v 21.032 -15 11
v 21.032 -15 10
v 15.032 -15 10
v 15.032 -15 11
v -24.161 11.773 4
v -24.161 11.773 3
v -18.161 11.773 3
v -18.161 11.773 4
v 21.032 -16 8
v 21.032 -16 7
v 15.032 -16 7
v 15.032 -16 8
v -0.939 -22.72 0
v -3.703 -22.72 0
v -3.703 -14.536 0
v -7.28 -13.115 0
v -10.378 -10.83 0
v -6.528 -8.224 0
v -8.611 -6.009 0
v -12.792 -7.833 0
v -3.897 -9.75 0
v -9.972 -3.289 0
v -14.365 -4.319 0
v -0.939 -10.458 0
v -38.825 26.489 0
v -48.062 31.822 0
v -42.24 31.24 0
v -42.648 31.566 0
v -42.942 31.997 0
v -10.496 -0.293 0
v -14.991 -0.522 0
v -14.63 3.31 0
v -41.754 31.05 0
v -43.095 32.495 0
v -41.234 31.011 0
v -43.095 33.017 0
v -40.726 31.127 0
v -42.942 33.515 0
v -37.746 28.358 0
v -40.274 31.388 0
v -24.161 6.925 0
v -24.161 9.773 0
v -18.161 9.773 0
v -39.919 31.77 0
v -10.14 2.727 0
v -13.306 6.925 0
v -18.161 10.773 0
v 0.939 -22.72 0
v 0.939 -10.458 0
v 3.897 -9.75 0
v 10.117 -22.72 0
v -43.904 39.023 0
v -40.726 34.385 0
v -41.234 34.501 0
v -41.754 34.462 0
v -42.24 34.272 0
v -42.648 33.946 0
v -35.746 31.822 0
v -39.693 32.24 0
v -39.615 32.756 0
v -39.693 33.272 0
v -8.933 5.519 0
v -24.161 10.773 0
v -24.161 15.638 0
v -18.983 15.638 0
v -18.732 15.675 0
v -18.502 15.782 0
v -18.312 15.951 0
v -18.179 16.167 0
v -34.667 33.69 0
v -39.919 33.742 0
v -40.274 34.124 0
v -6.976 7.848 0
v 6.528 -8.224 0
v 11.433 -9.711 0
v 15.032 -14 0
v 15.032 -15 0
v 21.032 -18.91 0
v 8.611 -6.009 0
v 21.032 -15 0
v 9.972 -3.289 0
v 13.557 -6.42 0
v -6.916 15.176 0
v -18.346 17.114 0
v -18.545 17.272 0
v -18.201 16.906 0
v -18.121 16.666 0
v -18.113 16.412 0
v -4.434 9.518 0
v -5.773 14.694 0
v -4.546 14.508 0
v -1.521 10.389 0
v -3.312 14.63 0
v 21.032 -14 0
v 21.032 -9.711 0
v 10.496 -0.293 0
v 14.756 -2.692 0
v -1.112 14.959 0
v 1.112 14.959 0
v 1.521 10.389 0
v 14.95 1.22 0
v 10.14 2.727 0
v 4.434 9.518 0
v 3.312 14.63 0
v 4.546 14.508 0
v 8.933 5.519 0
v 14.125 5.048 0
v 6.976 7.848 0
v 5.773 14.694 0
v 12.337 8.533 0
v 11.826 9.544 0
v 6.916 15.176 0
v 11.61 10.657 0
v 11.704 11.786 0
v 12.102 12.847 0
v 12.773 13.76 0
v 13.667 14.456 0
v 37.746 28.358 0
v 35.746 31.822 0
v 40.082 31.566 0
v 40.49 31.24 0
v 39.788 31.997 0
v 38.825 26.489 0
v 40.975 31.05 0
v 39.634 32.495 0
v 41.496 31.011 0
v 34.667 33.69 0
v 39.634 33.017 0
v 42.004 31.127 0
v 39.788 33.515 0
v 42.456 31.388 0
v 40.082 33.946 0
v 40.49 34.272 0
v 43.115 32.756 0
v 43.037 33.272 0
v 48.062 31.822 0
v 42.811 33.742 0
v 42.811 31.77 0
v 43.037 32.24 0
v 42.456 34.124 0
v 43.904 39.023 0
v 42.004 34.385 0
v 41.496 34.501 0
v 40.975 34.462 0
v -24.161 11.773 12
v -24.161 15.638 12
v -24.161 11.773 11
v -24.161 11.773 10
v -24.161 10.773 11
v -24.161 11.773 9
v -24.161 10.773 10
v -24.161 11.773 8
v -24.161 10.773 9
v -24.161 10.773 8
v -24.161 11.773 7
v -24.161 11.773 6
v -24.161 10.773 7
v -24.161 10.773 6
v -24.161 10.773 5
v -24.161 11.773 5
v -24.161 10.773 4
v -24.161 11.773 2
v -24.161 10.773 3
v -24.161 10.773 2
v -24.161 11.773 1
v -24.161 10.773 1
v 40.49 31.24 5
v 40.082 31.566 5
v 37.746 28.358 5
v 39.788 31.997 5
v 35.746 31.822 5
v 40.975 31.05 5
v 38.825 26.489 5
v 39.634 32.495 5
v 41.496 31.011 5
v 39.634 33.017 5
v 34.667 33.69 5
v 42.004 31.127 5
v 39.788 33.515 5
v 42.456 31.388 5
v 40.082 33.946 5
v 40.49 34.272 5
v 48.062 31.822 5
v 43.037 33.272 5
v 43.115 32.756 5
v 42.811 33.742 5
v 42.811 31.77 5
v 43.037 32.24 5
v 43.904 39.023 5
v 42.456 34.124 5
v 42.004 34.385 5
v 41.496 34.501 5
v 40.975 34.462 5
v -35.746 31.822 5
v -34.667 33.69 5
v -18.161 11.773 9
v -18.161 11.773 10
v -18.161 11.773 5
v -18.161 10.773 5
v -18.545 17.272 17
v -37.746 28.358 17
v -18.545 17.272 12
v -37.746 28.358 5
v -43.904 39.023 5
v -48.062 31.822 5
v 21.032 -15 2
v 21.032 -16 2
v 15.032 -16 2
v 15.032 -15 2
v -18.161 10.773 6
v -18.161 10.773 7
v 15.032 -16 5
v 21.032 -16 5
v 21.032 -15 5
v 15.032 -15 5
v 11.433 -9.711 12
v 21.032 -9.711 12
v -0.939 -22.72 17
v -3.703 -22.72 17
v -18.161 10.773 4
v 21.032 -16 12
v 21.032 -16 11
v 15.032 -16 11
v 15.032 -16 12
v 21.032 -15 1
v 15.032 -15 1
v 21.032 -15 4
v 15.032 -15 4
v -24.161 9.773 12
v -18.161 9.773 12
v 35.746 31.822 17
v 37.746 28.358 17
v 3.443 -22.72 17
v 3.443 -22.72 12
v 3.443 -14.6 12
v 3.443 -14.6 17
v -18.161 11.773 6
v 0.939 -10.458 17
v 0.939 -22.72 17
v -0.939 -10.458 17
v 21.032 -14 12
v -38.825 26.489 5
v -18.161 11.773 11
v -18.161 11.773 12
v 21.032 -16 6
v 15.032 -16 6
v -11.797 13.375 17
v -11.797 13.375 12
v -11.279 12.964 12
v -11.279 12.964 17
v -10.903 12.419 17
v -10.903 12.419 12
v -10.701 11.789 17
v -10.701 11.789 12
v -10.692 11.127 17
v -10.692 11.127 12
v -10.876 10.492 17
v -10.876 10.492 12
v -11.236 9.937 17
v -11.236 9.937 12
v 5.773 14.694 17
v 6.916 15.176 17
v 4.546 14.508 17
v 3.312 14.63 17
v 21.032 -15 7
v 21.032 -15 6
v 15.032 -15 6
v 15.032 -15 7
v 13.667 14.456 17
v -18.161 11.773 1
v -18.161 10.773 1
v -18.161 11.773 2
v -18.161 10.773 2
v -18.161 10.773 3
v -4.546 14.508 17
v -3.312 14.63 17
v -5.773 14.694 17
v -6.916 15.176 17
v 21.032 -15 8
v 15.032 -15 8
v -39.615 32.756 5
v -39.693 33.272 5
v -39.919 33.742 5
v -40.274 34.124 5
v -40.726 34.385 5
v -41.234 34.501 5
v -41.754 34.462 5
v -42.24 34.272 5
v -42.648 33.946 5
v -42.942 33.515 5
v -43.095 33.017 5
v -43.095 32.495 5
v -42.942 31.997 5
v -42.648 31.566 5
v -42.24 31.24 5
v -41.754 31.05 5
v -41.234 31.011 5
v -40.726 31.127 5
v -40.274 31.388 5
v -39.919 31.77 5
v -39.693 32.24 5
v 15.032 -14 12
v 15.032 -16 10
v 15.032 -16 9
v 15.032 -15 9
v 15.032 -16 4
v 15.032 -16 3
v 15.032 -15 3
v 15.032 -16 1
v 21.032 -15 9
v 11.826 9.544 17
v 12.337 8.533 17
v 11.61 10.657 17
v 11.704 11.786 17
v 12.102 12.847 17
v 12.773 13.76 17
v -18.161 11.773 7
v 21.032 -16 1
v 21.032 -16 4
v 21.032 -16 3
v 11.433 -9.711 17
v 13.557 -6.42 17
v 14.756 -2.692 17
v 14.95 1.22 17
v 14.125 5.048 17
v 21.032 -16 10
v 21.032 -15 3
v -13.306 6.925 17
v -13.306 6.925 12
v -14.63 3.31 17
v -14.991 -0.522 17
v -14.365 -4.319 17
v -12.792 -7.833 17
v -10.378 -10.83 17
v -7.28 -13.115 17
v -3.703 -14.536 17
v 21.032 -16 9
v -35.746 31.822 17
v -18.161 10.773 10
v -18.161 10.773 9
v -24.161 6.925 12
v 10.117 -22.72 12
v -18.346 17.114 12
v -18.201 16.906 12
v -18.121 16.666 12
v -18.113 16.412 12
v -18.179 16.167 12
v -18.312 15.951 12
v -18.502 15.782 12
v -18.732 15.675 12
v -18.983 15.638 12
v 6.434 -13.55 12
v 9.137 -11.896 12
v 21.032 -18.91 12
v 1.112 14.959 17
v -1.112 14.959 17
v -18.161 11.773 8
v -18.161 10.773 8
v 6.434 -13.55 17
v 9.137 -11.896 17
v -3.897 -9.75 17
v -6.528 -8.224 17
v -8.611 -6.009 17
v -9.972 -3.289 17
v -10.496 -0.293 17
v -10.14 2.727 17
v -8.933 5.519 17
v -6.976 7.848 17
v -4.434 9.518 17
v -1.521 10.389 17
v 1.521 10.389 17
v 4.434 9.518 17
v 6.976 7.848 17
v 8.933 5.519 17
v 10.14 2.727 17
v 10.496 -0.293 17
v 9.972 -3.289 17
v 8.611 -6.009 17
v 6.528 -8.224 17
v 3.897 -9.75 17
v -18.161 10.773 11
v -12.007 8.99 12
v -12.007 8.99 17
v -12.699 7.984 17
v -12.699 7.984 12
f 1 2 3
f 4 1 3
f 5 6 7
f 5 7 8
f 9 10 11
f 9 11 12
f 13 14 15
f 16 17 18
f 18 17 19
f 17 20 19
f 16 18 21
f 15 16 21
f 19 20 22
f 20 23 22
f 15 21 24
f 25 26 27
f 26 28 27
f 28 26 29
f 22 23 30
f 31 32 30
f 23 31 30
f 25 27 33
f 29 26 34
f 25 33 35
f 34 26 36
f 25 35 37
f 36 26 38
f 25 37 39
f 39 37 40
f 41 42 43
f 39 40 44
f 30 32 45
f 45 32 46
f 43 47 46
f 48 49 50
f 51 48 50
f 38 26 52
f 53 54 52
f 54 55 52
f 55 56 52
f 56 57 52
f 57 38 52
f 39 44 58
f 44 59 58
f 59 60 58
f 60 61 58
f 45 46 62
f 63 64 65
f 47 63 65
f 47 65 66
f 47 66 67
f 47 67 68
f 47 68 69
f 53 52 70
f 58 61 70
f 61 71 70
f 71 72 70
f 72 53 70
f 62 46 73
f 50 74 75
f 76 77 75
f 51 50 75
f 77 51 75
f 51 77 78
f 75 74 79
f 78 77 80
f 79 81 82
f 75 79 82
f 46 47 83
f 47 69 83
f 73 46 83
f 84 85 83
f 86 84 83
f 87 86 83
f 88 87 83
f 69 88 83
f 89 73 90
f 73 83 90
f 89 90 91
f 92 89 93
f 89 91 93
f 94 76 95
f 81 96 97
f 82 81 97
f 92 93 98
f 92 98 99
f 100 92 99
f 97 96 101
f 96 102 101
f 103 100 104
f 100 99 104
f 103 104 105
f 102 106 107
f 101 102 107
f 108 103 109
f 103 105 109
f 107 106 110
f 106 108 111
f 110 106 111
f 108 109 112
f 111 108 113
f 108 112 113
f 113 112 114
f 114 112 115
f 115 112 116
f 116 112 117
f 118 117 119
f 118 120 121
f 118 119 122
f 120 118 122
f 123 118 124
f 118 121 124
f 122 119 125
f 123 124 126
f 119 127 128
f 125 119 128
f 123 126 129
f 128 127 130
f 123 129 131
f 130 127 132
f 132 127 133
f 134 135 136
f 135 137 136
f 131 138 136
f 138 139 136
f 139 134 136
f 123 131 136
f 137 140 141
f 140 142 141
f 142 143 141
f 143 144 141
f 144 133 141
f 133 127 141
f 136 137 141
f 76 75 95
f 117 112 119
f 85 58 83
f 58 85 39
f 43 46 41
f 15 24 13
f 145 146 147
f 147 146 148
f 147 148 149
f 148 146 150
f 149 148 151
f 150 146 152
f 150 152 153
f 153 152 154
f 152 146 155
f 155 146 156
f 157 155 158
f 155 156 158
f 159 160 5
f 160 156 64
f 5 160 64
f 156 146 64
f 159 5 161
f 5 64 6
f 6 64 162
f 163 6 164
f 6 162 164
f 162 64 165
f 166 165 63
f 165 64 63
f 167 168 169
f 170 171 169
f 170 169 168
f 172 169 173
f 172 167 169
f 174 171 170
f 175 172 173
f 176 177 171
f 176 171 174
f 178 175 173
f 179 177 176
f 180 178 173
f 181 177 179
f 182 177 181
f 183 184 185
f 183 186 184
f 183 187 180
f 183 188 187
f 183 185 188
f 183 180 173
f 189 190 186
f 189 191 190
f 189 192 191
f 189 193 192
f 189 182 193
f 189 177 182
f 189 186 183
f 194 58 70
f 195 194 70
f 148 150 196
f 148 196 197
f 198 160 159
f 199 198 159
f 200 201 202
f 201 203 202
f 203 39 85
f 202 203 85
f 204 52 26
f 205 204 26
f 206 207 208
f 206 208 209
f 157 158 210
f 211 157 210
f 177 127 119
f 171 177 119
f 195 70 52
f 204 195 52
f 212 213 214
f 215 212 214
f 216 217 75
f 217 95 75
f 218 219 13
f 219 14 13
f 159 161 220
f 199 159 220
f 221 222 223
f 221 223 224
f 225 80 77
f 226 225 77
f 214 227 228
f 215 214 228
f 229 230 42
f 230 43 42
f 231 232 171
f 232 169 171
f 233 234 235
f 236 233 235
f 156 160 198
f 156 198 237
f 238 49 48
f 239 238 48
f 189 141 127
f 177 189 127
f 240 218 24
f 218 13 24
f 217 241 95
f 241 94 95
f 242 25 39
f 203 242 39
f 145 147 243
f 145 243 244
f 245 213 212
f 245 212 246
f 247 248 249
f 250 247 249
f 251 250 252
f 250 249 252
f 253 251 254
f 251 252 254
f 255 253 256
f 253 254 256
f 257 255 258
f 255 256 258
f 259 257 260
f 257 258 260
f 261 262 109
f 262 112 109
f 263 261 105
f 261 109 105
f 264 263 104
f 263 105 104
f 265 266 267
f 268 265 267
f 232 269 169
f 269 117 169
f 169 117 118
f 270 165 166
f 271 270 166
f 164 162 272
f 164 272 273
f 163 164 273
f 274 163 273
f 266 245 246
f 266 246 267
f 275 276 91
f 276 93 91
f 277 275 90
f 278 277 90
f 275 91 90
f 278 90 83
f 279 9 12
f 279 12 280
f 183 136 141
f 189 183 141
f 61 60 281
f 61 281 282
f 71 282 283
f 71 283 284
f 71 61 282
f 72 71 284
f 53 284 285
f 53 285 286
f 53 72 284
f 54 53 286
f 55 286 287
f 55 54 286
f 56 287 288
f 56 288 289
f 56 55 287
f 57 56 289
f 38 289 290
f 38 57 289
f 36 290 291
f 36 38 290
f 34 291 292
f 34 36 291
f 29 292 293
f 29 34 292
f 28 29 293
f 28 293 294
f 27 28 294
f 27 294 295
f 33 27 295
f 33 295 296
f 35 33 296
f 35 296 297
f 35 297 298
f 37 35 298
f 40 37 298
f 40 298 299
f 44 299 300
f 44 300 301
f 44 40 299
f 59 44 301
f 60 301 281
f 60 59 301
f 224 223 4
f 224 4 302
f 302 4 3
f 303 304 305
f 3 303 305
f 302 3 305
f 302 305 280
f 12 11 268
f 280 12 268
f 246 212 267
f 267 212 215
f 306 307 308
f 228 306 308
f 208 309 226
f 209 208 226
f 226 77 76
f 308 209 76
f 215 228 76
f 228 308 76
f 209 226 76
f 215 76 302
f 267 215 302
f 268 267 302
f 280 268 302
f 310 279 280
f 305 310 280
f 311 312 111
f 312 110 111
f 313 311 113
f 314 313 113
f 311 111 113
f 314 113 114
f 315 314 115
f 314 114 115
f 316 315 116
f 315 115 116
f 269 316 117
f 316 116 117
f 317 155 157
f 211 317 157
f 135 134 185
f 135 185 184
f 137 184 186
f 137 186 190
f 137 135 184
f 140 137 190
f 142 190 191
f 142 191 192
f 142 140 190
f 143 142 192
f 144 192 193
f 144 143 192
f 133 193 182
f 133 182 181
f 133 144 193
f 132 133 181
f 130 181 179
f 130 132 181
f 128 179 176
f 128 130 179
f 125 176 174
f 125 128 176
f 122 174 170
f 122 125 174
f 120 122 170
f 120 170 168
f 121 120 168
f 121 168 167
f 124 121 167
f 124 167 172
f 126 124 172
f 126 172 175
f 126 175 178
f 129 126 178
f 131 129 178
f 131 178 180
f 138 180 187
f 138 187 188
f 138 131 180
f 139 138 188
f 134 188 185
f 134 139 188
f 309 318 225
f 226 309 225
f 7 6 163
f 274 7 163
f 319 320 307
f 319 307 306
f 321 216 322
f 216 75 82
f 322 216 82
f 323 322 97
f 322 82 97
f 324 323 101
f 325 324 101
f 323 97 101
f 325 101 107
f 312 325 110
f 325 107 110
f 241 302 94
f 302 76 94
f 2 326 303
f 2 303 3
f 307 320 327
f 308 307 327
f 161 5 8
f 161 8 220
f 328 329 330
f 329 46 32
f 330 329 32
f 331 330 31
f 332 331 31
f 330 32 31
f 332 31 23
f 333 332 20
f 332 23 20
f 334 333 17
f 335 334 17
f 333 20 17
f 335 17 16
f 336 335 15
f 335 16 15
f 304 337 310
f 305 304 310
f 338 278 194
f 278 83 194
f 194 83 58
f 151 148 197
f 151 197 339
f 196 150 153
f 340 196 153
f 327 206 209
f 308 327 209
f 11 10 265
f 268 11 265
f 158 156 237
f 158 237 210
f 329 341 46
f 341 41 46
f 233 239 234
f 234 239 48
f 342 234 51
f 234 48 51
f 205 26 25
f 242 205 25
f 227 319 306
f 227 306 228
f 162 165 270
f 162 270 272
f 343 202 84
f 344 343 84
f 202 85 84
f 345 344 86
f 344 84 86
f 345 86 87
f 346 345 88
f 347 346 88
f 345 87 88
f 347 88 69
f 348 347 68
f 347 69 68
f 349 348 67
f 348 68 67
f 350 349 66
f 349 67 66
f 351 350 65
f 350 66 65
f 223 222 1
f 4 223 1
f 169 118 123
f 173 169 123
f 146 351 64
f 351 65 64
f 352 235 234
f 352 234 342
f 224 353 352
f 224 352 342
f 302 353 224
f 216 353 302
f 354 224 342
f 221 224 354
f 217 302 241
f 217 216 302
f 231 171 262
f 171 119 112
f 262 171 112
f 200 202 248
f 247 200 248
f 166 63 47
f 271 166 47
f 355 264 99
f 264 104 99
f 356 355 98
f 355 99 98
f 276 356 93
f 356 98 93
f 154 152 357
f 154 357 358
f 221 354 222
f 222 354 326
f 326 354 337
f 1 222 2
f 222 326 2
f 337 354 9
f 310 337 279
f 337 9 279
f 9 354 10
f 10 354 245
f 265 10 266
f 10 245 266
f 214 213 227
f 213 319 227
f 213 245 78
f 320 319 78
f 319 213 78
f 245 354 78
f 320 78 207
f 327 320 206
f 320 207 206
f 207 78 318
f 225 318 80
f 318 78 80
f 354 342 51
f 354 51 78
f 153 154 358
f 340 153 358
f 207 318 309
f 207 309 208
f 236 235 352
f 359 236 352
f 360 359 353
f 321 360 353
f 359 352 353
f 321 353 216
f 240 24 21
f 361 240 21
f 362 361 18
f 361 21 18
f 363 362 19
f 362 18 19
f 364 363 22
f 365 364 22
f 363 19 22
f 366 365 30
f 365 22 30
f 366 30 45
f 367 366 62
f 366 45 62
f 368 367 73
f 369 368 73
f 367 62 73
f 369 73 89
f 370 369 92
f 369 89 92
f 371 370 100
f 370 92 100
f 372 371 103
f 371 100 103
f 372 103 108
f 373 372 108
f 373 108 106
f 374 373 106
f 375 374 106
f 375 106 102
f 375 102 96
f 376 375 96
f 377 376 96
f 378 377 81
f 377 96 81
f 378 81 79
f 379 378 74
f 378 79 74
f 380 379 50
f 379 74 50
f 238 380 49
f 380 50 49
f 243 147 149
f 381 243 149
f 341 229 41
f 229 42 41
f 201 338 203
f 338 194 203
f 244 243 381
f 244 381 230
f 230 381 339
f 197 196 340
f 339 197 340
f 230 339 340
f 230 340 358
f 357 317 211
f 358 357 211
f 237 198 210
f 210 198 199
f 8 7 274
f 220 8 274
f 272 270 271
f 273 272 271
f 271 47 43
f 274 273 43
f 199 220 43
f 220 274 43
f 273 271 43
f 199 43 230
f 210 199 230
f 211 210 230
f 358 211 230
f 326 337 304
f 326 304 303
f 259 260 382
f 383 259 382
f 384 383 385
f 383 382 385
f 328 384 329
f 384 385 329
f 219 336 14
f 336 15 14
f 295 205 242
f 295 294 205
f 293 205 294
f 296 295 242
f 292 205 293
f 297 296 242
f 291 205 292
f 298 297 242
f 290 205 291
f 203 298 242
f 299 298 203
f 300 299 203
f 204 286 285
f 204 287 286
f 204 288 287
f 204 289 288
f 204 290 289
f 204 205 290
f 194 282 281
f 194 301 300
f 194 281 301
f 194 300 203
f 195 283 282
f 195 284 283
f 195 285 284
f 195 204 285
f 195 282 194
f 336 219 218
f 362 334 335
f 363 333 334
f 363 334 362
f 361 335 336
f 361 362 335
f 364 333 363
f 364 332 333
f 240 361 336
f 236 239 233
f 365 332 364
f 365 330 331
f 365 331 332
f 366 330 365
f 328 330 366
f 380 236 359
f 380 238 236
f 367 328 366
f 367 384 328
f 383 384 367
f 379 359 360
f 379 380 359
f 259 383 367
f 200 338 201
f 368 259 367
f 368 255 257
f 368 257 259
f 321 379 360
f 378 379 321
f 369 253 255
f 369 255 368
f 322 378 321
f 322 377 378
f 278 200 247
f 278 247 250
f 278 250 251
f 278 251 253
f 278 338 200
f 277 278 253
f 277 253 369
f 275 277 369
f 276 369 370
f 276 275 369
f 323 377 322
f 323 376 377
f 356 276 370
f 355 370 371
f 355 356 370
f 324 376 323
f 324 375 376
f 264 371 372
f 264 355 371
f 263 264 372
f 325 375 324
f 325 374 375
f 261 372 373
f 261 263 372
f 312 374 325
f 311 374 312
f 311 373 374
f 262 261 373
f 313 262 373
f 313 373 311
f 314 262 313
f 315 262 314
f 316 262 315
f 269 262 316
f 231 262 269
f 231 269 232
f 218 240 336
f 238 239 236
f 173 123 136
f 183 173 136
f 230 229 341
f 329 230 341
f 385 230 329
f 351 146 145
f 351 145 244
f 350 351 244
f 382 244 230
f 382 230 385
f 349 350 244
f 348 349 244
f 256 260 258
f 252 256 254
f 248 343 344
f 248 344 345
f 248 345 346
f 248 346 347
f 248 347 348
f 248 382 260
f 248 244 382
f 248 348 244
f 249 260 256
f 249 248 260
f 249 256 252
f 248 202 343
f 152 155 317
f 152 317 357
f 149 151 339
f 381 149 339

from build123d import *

# Parameters (mm, degrees)
F0_R     = 1.75
F1_DEPTH = 5
F3_DEPTH = 7
F5_DEPTH = 5
F6_W     = 1
F6_H     = 1
F7_DEPTH = 6
F8_W     = 1
F8_H     = 1
F9_DEPTH = 6


with BuildPart() as f1:
    # F0 (on Top) → F1 (new body)
    with BuildSketch(Plane.XY):
        with BuildLine():
            ThreePointArc((-0.9388981295, -10.4579381478), (0, 10.5), (0.9388981295, -10.4579381478))
            Line((0.9388981295, -10.4579381478), (0.9388981295, -14.9705868389))
            Line((0.9388981295, -14.9705868389), (0.9388981295, -22.7195436882))
            Line((0.9388981295, -22.7195436882), (4.4024475525, -22.7195436882))
            Line((4.4024475525, -22.7195436882), (10.116501772, -22.7195436882))
            Line((10.116501772, -22.7195436882), (21.0318053748, -18.9101754503))
            Line((21.0318053748, -18.9101754503), (21.0318053748, -15))
            Line((21.0318053748, -15), (15.0318053748, -15))
            Line((15.0318053748, -15), (15.0318053748, -14))
            Line((15.0318053748, -14), (21.0318053748, -14))
            Line((21.0318053748, -14), (21.0318053748, -9.7105238683))
            Line((21.0318053748, -9.7105238683), (11.4326605041, -9.7105238683))
            ThreePointArc((11.4326605041, -9.7105238683), (14.9816222336, -0.7422905424), (12.3365595381, 8.5328365016))
            ThreePointArc((12.3365595381, 8.5328365016), (11.704066925, 11.7858634787), (13.6674751693, 14.4555562485))
            Line((13.6674751693, 14.4555562485), (37.7463729757, 28.3575143788))
            Line((37.7463729757, 28.3575143788), (38.825355636, 26.4886615908))
            Line((38.825355636, 26.4886615908), (48.0623036168, 31.821615994))
            Line((48.0623036168, 31.821615994), (43.9043382963, 39.0234231853))
            Line((43.9043382963, 39.0234231853), (34.6673903154, 33.6904687821))
            Line((34.6673903154, 33.6904687821), (35.7463729757, 31.821615994))
            Line((35.7463729757, 31.821615994), (6.9158291977, 15.1762937829))
            ThreePointArc((6.9158291977, 15.1762937829), (5.1654246928, 14.5629294653), (3.3118718983, 14.6298156013))
            ThreePointArc((3.3118718983, 14.6298156013), (0, 15), (-3.3118718983, 14.6298156013))
            ThreePointArc((-3.3118718983, 14.6298156013), (-5.1654246928, 14.5629294653), (-6.9158291977, 15.1762937829))
            Line((-6.9158291977, 15.1762937829), (-35.7463729757, 31.821615994))
            Line((-35.7463729757, 31.821615994), (-34.6673903154, 33.6904687821))
            Line((-34.6673903154, 33.6904687821), (-43.9043382963, 39.0234231853))
            Line((-43.9043382963, 39.0234231853), (-48.0623036168, 31.821615994))
            Line((-48.0623036168, 31.821615994), (-38.825355636, 26.4886615908))
            Line((-38.825355636, 26.4886615908), (-37.7463729757, 28.3575143788))
            Line((-37.7463729757, 28.3575143788), (-18.5453659437, 17.2718078002))
            ThreePointArc((-18.5453659437, 17.2718078002), (-18.1373653852, 16.2868073185), (-18.9832044744, 15.6377721578))
            Line((-18.9832044744, 15.6377721578), (-24.1605976116, 15.6377721578))
            Line((-24.1605976116, 15.6377721578), (-24.1605976116, 10.7727729008))
            Line((-24.1605976116, 10.7727729008), (-18.1605976116, 10.7727729008))
            Line((-18.1605976116, 10.7727729008), (-18.1605976116, 9.7727729008))
            Line((-18.1605976116, 9.7727729008), (-24.1605976116, 9.7727729008))
            Line((-24.1605976116, 9.7727729008), (-24.1605976116, 6.9246333643))
            Line((-24.1605976116, 6.9246333643), (-13.3059931147, 6.9246333643))
            ThreePointArc((-13.3059931147, 6.9246333643), (-13.6917078006, -6.1267558709), (-3.7029089872, -14.5357650309))
            Line((-3.7029089872, -14.5357650309), (-3.7029089872, -22.7195436882))
            Line((-3.7029089872, -22.7195436882), (-0.9388981295, -22.7195436882))
            Line((-0.9388981295, -22.7195436882), (-0.9388981295, -14.9705868389))
            Line((-0.9388981295, -14.9705868389), (-0.9388981295, -10.4579381478))
        make_face()
        with Locations((-41.3648469661, 32.756042388)):
            Circle(F0_R, mode=Mode.SUBTRACT)
        with Locations((41.3648469661, 32.756042388)):
            Circle(F0_R, mode=Mode.SUBTRACT)
    extrude(amount=F1_DEPTH)

    # F2 (on face) → F3 (join)
    with BuildSketch(Plane.XY.offset(5)):
        with BuildLine():
            Line((37.7463729757, 28.3575143788), (35.7463729757, 31.821615994))
            Line((35.7463729757, 31.821615994), (6.9158291977, 15.1762937829))
            ThreePointArc((6.9158291977, 15.1762937829), (5.1654246928, 14.5629294653), (3.3118718983, 14.6298156013))
            ThreePointArc((3.3118718983, 14.6298156013), (0, 15), (-3.3118718983, 14.6298156013))
            ThreePointArc((-3.3118718983, 14.6298156013), (-5.1654246928, 14.5629294653), (-6.9158291977, 15.1762937829))
            Line((-6.9158291977, 15.1762937829), (-35.7463729757, 31.821615994))
            Line((-35.7463729757, 31.821615994), (-37.7463729757, 28.3575143788))
            Line((-37.7463729757, 28.3575143788), (-18.5453659437, 17.2718078002))
            ThreePointArc((-18.5453659437, 17.2718078002), (-18.1373653852, 16.2868073185), (-18.9832044744, 15.6377721578))
            Line((-18.9832044744, 15.6377721578), (-24.1605976116, 15.6377721578))
            Line((-24.1605976116, 15.6377721578), (-24.1605976116, 10.7727729008))
            Line((-24.1605976116, 10.7727729008), (-18.1605976116, 10.7727729008))
            Line((-18.1605976116, 10.7727729008), (-18.1605976116, 9.7727729008))
            Line((-18.1605976116, 9.7727729008), (-24.1605976116, 9.7727729008))
            Line((-24.1605976116, 9.7727729008), (-24.1605976116, 6.9246333643))
            Line((-24.1605976116, 6.9246333643), (-13.3059931147, 6.9246333643))
            ThreePointArc((-13.3059931147, 6.9246333643), (-13.6917078006, -6.1267558709), (-3.7029089872, -14.5357650309))
            Line((-3.7029089872, -14.5357650309), (-3.7029089872, -22.7195436882))
            Line((-3.7029089872, -22.7195436882), (-0.9388981295, -22.7195436882))
            Line((-0.9388981295, -22.7195436882), (-0.9388981295, -10.4579381478))
            ThreePointArc((-0.9388981295, -10.4579381478), (0, 10.5), (0.9388981295, -10.4579381478))
            Line((0.9388981295, -10.4579381478), (0.9388981295, -22.7195436882))
            Line((0.9388981295, -22.7195436882), (10.116501772, -22.7195436882))
            Line((10.116501772, -22.7195436882), (21.0318053748, -18.9101754503))
            Line((21.0318053748, -18.9101754503), (21.0318053748, -15))
            Line((21.0318053748, -15), (15.0318053748, -15))
            Line((15.0318053748, -15), (15.0318053748, -14))
            Line((15.0318053748, -14), (21.0318053748, -14))
            Line((21.0318053748, -14), (21.0318053748, -9.7105238683))
            Line((21.0318053748, -9.7105238683), (11.4326605041, -9.7105238683))
            ThreePointArc((11.4326605041, -9.7105238683), (14.9816222336, -0.7422905424), (12.3365595381, 8.5328365016))
            ThreePointArc((12.3365595381, 8.5328365016), (11.704066925, 11.7858634787), (13.6674751693, 14.4555562485))
            Line((13.6674751693, 14.4555562485), (37.7463729757, 28.3575143788))
        make_face()
    extrude(amount=F3_DEPTH)

    # F4 (on face) → F5 (join)
    with BuildSketch(Plane.XY.offset(12)):
        with BuildLine():
            Line((0.9388981295, -22.7195436882), (3.4428494982, -22.7195436882))
            Line((3.4428494982, -22.7195436882), (3.4428494982, -14.5995475044))
            ThreePointArc((3.4428494982, -14.5995475044), (7.8291658231, -12.7946927479), (11.4326605041, -9.7105238683))
            ThreePointArc((11.4326605041, -9.7105238683), (14.9816222336, -0.7422905424), (12.3365595381, 8.5328365016))
            ThreePointArc((12.3365595381, 8.5328365016), (11.704066925, 11.7858634787), (13.6674751693, 14.4555562485))
            Line((13.6674751693, 14.4555562485), (37.7463729757, 28.3575143788))
            Line((37.7463729757, 28.3575143788), (35.7463729757, 31.821615994))
            Line((35.7463729757, 31.821615994), (6.9158291977, 15.1762937829))
            ThreePointArc((6.9158291977, 15.1762937829), (5.1654246928, 14.5629294653), (3.3118718983, 14.6298156013))
            ThreePointArc((3.3118718983, 14.6298156013), (0, 15), (-3.3118718983, 14.6298156013))
            ThreePointArc((-3.3118718983, 14.6298156013), (-5.1654246928, 14.5629294653), (-6.9158291977, 15.1762937829))
            Line((-6.9158291977, 15.1762937829), (-35.7463729757, 31.821615994))
            Line((-35.7463729757, 31.821615994), (-37.7463729757, 28.3575143788))
            Line((-37.7463729757, 28.3575143788), (-18.5453659437, 17.2718078002))
            Line((-18.5453659437, 17.2718078002), (-11.7966768619, 13.3754503421))
            ThreePointArc((-11.7966768619, 13.3754503421), (-10.7011937418, 11.7891096419), (-11.2363395942, 9.9370353992))
            ThreePointArc((-11.2363395942, 9.9370353992), (-12.3632586806, 8.4941058856), (-13.3059931147, 6.9246333643))
            ThreePointArc((-13.3059931147, 6.9246333643), (-13.6917078006, -6.1267558709), (-3.7029089872, -14.5357650309))
            Line((-3.7029089872, -14.5357650309), (-3.7029089872, -22.7195436882))
            Line((-3.7029089872, -22.7195436882), (-0.9388981295, -22.7195436882))
            Line((-0.9388981295, -22.7195436882), (-0.9388981295, -10.4579381478))
            ThreePointArc((-0.9388981295, -10.4579381478), (0, 10.5), (0.9388981295, -10.4579381478))
            Line((0.9388981295, -10.4579381478), (0.9388981295, -22.7195436882))
        make_face()
    extrude(amount=F5_DEPTH)

    # F6 (on face) → F7 (cut)
    with BuildSketch(Plane.YZ.offset(21.0318053748)):
        with Locations((-15.5, 9.5)):
            Rectangle(F6_W, F6_H)
        with Locations((-15.5, 7.5)):
            Rectangle(F6_W, F6_H)
        with Locations((-15.5, 11.5)):
            Rectangle(F6_W, F6_H)
        with Locations((-15.5, 5.5)):
            Rectangle(F6_W, F6_H)
        with Locations((-15.5, 3.5)):
            Rectangle(F6_W, F6_H)
        with Locations((-15.5, 1.5)):
            Rectangle(F6_W, F6_H)
    extrude(amount=-F7_DEPTH, mode=Mode.SUBTRACT)

    # F8 (on face) → F9 (cut)
    with BuildSketch(Plane(origin=(-24.1605976116, 0, 0), x_dir=(0, -1, 0), z_dir=(-1, 0, 0))):
        with Locations((-11.2727729008, 11.5)):
            Rectangle(F8_W, F8_H)
        with Locations((-11.2727729008, 9.5)):
            Rectangle(F8_W, F8_H)
        with Locations((-11.2727729008, 7.5)):
            Rectangle(F8_W, F8_H)
        with Locations((-11.2727729008, 5.5)):
            Rectangle(F8_W, F8_H)
        with Locations((-11.2727729008, 3.5)):
            Rectangle(F8_W, F8_H)
        with Locations((-11.2727729008, 1.5)):
            Rectangle(F8_W, F8_H)
    extrude(amount=-F9_DEPTH, mode=Mode.SUBTRACT)


solid = f1.part
